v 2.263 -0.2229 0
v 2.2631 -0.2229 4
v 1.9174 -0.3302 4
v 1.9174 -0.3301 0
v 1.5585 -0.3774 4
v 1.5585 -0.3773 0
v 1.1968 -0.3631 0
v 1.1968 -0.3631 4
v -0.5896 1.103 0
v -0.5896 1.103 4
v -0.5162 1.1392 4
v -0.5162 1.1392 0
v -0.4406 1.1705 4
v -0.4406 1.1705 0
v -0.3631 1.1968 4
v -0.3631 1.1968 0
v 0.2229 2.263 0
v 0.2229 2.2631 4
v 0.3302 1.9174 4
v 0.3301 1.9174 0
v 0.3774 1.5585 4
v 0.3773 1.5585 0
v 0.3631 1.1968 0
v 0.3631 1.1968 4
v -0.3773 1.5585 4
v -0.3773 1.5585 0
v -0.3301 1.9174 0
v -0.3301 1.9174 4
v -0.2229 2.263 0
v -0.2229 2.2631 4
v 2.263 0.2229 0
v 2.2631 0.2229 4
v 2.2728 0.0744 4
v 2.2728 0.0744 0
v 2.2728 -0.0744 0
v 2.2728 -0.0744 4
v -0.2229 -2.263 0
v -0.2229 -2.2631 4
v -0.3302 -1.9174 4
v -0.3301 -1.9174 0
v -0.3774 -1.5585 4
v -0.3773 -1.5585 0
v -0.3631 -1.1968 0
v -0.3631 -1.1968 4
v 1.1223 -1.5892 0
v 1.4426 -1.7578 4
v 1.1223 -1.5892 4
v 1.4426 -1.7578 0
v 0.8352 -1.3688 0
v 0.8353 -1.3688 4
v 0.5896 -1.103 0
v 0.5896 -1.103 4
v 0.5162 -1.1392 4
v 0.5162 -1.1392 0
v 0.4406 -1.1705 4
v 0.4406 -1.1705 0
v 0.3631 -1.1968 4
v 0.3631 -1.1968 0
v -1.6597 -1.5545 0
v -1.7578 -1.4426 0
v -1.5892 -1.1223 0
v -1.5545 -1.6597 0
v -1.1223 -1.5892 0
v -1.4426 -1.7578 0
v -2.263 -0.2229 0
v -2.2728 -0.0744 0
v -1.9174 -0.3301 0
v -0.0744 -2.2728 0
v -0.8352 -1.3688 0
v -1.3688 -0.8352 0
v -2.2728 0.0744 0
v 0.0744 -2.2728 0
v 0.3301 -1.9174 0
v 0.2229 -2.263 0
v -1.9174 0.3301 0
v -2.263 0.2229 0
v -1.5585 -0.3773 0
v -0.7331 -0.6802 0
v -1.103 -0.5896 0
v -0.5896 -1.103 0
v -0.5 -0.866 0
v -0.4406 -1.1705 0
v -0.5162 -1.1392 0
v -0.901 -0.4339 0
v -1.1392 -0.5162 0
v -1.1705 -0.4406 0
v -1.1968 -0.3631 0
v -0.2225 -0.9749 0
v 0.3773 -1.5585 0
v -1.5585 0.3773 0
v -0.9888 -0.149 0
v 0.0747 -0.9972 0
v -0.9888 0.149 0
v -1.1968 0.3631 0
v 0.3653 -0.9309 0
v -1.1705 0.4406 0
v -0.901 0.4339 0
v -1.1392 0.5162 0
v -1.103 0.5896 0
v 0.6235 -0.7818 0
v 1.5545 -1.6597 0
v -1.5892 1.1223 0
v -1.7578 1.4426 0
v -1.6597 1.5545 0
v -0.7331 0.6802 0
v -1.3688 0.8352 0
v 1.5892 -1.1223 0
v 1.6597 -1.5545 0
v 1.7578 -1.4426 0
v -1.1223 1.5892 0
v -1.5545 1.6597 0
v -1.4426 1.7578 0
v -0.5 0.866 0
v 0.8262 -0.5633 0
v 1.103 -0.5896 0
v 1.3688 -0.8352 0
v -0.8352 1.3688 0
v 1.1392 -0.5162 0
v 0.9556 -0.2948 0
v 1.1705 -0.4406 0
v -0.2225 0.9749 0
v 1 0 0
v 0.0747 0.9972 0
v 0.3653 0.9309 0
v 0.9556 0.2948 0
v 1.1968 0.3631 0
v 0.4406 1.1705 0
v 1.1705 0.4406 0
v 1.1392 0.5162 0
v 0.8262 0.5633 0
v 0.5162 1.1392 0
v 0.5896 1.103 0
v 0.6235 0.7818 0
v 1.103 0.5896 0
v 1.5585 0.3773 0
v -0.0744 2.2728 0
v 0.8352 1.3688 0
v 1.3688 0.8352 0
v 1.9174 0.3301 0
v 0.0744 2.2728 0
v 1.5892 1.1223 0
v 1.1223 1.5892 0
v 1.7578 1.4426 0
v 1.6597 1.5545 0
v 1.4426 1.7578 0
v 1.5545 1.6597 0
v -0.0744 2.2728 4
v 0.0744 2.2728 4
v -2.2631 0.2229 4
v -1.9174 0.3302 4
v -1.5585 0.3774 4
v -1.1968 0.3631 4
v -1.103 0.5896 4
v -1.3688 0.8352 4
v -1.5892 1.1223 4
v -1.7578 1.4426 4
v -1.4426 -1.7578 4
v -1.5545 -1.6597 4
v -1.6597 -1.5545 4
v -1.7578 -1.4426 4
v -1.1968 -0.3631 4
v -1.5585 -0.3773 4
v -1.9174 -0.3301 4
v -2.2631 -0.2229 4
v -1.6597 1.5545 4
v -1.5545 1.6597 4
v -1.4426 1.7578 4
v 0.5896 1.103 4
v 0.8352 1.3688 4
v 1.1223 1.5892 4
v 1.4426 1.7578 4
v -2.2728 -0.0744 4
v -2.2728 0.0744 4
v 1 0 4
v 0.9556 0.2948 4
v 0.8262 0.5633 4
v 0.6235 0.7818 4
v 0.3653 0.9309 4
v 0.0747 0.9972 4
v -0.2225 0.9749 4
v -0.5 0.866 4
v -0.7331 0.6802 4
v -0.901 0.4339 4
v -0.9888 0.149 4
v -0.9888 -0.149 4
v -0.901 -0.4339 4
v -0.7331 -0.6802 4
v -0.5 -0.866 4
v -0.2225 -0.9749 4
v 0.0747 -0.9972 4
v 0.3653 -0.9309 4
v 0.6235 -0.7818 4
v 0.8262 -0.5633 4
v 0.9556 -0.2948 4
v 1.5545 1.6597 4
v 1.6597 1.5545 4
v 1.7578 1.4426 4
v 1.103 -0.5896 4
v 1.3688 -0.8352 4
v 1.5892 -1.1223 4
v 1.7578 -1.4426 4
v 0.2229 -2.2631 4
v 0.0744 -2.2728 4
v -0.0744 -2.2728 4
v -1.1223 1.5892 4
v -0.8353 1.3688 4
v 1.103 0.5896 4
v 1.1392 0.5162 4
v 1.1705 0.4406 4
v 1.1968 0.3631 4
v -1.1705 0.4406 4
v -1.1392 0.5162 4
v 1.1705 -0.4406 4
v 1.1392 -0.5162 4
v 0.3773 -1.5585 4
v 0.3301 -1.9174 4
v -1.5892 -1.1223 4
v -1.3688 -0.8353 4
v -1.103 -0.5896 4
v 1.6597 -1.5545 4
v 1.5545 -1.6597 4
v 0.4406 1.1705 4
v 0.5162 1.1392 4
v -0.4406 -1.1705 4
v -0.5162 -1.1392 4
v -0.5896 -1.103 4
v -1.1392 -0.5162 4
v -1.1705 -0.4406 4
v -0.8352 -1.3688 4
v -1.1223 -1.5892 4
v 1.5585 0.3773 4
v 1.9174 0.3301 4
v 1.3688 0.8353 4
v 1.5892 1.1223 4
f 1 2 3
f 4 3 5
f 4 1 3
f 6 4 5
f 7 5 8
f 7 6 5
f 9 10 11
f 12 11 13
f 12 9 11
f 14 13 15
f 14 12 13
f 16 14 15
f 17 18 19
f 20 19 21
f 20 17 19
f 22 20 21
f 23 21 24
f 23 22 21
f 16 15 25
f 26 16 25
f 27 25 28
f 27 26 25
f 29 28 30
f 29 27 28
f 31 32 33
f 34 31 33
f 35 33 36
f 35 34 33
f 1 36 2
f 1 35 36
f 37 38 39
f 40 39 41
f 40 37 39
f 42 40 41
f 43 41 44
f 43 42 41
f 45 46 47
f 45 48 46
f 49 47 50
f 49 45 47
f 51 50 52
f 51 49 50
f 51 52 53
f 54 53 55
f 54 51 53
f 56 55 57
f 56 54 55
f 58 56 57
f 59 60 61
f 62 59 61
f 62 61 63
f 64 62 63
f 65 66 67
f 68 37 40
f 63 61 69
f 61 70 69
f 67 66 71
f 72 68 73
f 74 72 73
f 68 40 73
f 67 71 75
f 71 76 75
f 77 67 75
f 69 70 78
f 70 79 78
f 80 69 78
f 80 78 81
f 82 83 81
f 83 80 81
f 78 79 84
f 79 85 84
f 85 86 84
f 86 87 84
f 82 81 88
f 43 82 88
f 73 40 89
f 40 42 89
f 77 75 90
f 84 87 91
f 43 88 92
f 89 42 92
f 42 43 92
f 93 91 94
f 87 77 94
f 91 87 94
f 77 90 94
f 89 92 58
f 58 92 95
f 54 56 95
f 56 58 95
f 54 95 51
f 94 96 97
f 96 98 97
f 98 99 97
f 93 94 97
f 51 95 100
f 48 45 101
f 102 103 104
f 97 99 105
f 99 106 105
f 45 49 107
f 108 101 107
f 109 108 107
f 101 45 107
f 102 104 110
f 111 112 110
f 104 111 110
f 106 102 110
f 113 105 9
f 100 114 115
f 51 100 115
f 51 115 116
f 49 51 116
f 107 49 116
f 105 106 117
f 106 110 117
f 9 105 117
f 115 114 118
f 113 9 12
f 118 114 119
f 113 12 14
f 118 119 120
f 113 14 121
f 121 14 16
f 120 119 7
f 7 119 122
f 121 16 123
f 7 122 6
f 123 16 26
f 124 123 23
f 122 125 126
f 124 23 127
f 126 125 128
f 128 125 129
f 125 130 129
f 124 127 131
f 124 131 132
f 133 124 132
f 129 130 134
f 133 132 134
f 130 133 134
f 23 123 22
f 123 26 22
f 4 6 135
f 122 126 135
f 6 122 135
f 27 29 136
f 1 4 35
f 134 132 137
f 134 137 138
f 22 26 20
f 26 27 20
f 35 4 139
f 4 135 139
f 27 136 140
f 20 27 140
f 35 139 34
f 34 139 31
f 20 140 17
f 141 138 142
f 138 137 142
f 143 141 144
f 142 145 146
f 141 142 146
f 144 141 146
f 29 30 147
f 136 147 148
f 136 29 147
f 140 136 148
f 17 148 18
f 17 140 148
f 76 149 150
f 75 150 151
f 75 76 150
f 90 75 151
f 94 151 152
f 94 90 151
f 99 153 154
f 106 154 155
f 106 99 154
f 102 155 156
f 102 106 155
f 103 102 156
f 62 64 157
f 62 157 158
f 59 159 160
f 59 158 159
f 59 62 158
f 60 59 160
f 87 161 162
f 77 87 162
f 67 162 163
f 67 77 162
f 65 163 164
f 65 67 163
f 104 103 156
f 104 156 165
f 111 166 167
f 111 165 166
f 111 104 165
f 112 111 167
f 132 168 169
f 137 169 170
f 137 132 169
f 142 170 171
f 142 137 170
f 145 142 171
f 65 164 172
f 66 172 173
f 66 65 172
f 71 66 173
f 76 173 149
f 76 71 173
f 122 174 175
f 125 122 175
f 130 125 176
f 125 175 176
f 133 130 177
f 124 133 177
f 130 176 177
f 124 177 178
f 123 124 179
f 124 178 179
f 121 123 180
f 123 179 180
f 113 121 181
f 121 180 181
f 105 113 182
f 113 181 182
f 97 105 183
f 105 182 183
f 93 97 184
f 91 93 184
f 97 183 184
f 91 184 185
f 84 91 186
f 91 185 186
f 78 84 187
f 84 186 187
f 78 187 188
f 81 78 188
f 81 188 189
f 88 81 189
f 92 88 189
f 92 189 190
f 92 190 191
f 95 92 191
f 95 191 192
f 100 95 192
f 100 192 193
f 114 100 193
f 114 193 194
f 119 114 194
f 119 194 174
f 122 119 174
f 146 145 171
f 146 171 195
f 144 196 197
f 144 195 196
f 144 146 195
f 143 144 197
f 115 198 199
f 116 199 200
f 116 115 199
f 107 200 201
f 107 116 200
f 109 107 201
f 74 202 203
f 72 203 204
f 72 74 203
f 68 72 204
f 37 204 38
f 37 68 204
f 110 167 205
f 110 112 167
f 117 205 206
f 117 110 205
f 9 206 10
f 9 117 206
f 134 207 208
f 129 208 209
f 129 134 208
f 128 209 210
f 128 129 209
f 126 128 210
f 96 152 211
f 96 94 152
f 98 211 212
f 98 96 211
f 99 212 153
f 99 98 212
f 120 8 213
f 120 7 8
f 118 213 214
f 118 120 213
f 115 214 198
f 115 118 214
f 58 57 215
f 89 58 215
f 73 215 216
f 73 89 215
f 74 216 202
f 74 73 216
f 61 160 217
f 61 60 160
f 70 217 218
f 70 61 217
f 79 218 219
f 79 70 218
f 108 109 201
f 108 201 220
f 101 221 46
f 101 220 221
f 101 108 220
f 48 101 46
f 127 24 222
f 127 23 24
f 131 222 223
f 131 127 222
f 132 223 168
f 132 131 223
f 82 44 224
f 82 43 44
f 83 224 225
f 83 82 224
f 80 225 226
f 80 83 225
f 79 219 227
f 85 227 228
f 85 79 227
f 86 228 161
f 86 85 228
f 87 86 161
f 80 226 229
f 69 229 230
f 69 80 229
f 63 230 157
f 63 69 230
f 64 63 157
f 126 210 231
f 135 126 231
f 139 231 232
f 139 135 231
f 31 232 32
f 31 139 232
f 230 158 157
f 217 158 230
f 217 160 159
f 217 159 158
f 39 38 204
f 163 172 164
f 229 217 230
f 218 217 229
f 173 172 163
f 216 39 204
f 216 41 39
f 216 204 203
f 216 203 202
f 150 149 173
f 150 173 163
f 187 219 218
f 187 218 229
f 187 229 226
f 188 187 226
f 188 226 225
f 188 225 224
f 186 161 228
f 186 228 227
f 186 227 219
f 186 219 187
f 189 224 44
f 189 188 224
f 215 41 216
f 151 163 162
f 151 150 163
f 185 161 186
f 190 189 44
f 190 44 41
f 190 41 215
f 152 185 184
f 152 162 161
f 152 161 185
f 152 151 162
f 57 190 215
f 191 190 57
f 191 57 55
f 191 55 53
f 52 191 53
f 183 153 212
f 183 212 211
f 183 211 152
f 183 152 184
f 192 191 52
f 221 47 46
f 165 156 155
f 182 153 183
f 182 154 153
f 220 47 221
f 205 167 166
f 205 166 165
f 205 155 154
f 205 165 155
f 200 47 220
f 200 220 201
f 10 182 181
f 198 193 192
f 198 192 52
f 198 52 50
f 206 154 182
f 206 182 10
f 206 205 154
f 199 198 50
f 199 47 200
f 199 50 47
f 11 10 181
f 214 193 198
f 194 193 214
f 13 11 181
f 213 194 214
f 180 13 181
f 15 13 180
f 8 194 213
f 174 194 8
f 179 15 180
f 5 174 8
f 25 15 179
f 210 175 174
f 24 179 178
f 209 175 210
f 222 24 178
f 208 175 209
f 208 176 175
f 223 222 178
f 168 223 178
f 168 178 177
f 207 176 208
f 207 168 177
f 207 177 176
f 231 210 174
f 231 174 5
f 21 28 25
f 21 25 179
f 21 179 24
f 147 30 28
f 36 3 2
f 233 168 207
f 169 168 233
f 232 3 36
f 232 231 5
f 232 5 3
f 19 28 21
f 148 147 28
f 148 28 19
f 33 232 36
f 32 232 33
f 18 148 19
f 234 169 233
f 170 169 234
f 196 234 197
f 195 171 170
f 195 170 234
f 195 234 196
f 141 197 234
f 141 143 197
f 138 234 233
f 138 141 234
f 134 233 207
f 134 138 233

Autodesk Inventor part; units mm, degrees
sketch "Sketch1" plane through (0, 0, 0) normal (0, 0, 1) x (1, 0, 0)
  circle A0 centre (0, 0) radius 2.274
  dimension "d0" = 4.548
extrude "Extrusion1" add sketch "Sketch1" along normal blind 20
ref_plane "Work Plane2" through (0, 0, 10) normal (0, 0, 1) x (1, 0, 0)
sketch "Sketch2" plane through (0, 0, 0) normal (0, 0, -1) x (-1, 0, 0)
  circle A0 centre (0, 0) radius 2.274 projected
  circle A1 centre (0, 0) radius 1.8192
  dimension "d3" = 3.6384
surface extrude "Pitch Diameter" sketch "Sketch2" against normal through all shown no curves A1
ref_plane "Work Plane8" through (0, 0, 0) normal (0.9238795, 0.3826834, 0) x (0, 0, 1)
ref_plane "Work Plane9" through (0, 0, 0) normal (1, 0, 0) x (0, 1, 0)
spur gear teeth "Spur Gear" teeth 8 pitch diameter 3.6384 tip diameter 4.548 root diameter 2.5014 face width 20 start plane through (0, 0, 0) normal (0, 0, -1) x (-1, 0, 0)
sketch "Sketch3" plane through (0, 0, 20) normal (0, 0, 1) x (1, 0, 0)
  arc A0 (-1.7578, 1.4426) -> (-1.103, 0.5896) centre (0.2047, 2.2712) ccw projected
  arc A1 (-1.103, 0.5896) -> (-1.1968, 0.3631) centre (0, 0) ccw projected
  arc A2 (-1.1968, 0.3631) -> (-2.2631, 0.2229) centre (-1.4613, -1.7508) ccw projected
  arc A3 (-2.2631, 0.2229) -> (-2.2631, -0.2229) centre (0, 0) ccw projected
  arc A4 (-2.2631, -0.2229) -> (-1.1968, -0.3631) centre (-1.4613, 1.7508) ccw projected
  arc A5 (-1.1968, -0.3631) -> (-1.103, -0.5896) centre (0, 0) ccw projected
  arc A6 (-1.103, -0.5896) -> (-1.7578, -1.4426) centre (0.2047, -2.2712) ccw projected
  arc A7 (-1.7578, -1.4426) -> (-1.4426, -1.7578) centre (0, 0) ccw projected
  arc A8 (-1.4426, -1.7578) -> (-0.5896, -1.103) centre (-2.2712, 0.2047) ccw projected
  arc A9 (-0.5896, -1.103) -> (-0.3631, -1.1968) centre (0, 0) ccw projected
  arc A10 (-0.3631, -1.1968) -> (-0.2229, -2.2631) centre (1.7508, -1.4613) ccw projected
  arc A11 (-0.2229, -2.2631) -> (0.2229, -2.2631) centre (0, 0) ccw projected
  arc A12 (0.2229, -2.2631) -> (0.3631, -1.1968) centre (-1.7508, -1.4613) ccw projected
  arc A13 (0.3631, -1.1968) -> (0.5896, -1.103) centre (0, 0) ccw projected
  arc A14 (0.5896, -1.103) -> (1.4426, -1.7578) centre (2.2712, 0.2047) ccw projected
  arc A15 (1.4426, -1.7578) -> (1.7578, -1.4426) centre (0, 0) ccw projected
  arc A16 (1.7578, -1.4426) -> (1.103, -0.5896) centre (-0.2047, -2.2712) ccw projected
  arc A17 (1.103, -0.5896) -> (1.1968, -0.3631) centre (0, 0) ccw projected
  arc A18 (1.1968, -0.3631) -> (2.2631, -0.2229) centre (1.4613, 1.7508) ccw projected
  arc A19 (2.2631, -0.2229) -> (2.2631, 0.2229) centre (0, 0) ccw projected
  arc A20 (2.2631, 0.2229) -> (1.1968, 0.3631) centre (1.4613, -1.7508) ccw projected
  arc A21 (1.1968, 0.3631) -> (1.103, 0.5896) centre (0, 0) ccw projected
  arc A22 (1.103, 0.5896) -> (1.7578, 1.4426) centre (-0.2047, 2.2712) ccw projected
  arc A23 (1.7578, 1.4426) -> (1.4426, 1.7578) centre (0, 0) ccw projected
  arc A24 (1.4426, 1.7578) -> (0.5896, 1.103) centre (2.2712, -0.2047) ccw projected
  arc A25 (0.5896, 1.103) -> (0.3631, 1.1968) centre (0, 0) ccw projected
  arc A26 (0.3631, 1.1968) -> (0.2229, 2.2631) centre (-1.7508, 1.4613) ccw projected
  arc A27 (0.2229, 2.2631) -> (-0.2229, 2.2631) centre (0, 0) ccw projected
  arc A28 (-0.2229, 2.2631) -> (-0.3631, 1.1968) centre (1.7508, 1.4613) ccw projected
  arc A29 (-0.3631, 1.1968) -> (-0.5896, 1.103) centre (0, 0) ccw projected
  arc A30 (-0.5896, 1.103) -> (-1.4426, 1.7578) centre (-2.2712, -0.2047) ccw projected
  arc A31 (-1.4426, 1.7578) -> (-1.7578, 1.4426) centre (0, 0) ccw projected
ref_plane "Work Plane11" through (-4.2612, 0.6505, 4) normal (0, 0, 1) x (0.9749279, -0.2225209, 0)
extrude "Extrusion2" cut sketch "Sketch3" against normal up to surface (16 mm away)
sketch "Sketch4" plane through (0, 0, 4) normal (0, 0, 1) x (1, 0, 0)
  arc A0 (-1.1968, 0.3631) -> (-2.2631, 0.2229) centre (-1.4613, -1.7508) ccw projected
  arc A1 (-2.2631, 0.2229) -> (-2.2631, -0.2229) centre (0, 0) ccw projected
  arc A2 (-2.2631, -0.2229) -> (-1.1968, -0.3631) centre (-1.4613, 1.7508) ccw projected
  arc A3 (-1.1968, -0.3631) -> (-1.103, -0.5896) centre (0, 0) ccw projected
  arc A4 (-1.103, -0.5896) -> (-1.7578, -1.4426) centre (0.2047, -2.2712) ccw projected
  arc A5 (-1.7578, -1.4426) -> (-1.4426, -1.7578) centre (0, 0) ccw projected
  arc A6 (-1.4426, -1.7578) -> (-0.5896, -1.103) centre (-2.2712, 0.2047) ccw projected
  arc A7 (-0.5896, -1.103) -> (-0.3631, -1.1968) centre (0, 0) ccw projected
  arc A8 (-0.3631, -1.1968) -> (-0.2229, -2.2631) centre (1.7508, -1.4613) ccw projected
  arc A9 (-0.2229, -2.2631) -> (0.2229, -2.2631) centre (0, 0) ccw projected
  arc A10 (0.2229, -2.2631) -> (0.3631, -1.1968) centre (-1.7508, -1.4613) ccw projected
  arc A11 (0.3631, -1.1968) -> (0.5896, -1.103) centre (0, 0) ccw projected
  arc A12 (0.5896, -1.103) -> (1.4426, -1.7578) centre (2.2712, 0.2047) ccw projected
  arc A13 (1.4426, -1.7578) -> (1.7578, -1.4426) centre (0, 0) ccw projected
  arc A14 (1.7578, -1.4426) -> (1.103, -0.5896) centre (-0.2047, -2.2712) ccw projected
  arc A15 (1.103, -0.5896) -> (1.1968, -0.3631) centre (0, 0) ccw projected
  arc A16 (1.1968, -0.3631) -> (2.2631, -0.2229) centre (1.4613, 1.7508) ccw projected
  arc A17 (2.2631, -0.2229) -> (2.2631, 0.2229) centre (0, 0) ccw projected
  arc A18 (2.2631, 0.2229) -> (1.1968, 0.3631) centre (1.4613, -1.7508) ccw projected
  arc A19 (1.1968, 0.3631) -> (1.103, 0.5896) centre (0, 0) ccw projected
  arc A20 (1.103, 0.5896) -> (1.7578, 1.4426) centre (-0.2047, 2.2712) ccw projected
  arc A21 (1.7578, 1.4426) -> (1.4426, 1.7578) centre (0, 0) ccw projected
  arc A22 (1.4426, 1.7578) -> (0.5896, 1.103) centre (2.2712, -0.2047) ccw projected
  arc A23 (0.5896, 1.103) -> (0.3631, 1.1968) centre (0, 0) ccw projected
  arc A24 (0.3631, 1.1968) -> (0.2229, 2.2631) centre (-1.7508, 1.4613) ccw projected
  arc A25 (0.2229, 2.2631) -> (-0.2229, 2.2631) centre (0, 0) ccw projected
  arc A26 (-0.2229, 2.2631) -> (-0.3631, 1.1968) centre (1.7508, 1.4613) ccw projected
  arc A27 (-0.3631, 1.1968) -> (-0.5896, 1.103) centre (0, 0) ccw projected
  arc A28 (-0.5896, 1.103) -> (-1.4426, 1.7578) centre (-2.2712, -0.2047) ccw projected
  arc A29 (-1.4426, 1.7578) -> (-1.7578, 1.4426) centre (0, 0) ccw projected
  arc A30 (-1.7578, 1.4426) -> (-1.103, 0.5896) centre (0.2047, 2.2712) ccw projected
  arc A31 (-1.103, 0.5896) -> (-1.1968, 0.3631) centre (0, 0) ccw projected
  circle A32 centre (0, 0) radius 1
  dimension "d51" = 2
extrude "Extrusion3" cut sketch "Sketch4" against normal through all contours A32
equation "\"d0\" = da_da"
equation "\"d1\" = da_b"
equation "\"d3\" = da_d"
equation "\"d16\" = da_aw"
equation "\"d43\" = da_aw"
equation "\"d46\" = da_aw"
equation "\"da_da\" = 4.548"
equation "\"da_b\" = 20"
equation "\"da_d\" = 3.6384"
equation "\"da_aw\" = 5.0028"
properties part number "Spur Gear1" material "Steel"
